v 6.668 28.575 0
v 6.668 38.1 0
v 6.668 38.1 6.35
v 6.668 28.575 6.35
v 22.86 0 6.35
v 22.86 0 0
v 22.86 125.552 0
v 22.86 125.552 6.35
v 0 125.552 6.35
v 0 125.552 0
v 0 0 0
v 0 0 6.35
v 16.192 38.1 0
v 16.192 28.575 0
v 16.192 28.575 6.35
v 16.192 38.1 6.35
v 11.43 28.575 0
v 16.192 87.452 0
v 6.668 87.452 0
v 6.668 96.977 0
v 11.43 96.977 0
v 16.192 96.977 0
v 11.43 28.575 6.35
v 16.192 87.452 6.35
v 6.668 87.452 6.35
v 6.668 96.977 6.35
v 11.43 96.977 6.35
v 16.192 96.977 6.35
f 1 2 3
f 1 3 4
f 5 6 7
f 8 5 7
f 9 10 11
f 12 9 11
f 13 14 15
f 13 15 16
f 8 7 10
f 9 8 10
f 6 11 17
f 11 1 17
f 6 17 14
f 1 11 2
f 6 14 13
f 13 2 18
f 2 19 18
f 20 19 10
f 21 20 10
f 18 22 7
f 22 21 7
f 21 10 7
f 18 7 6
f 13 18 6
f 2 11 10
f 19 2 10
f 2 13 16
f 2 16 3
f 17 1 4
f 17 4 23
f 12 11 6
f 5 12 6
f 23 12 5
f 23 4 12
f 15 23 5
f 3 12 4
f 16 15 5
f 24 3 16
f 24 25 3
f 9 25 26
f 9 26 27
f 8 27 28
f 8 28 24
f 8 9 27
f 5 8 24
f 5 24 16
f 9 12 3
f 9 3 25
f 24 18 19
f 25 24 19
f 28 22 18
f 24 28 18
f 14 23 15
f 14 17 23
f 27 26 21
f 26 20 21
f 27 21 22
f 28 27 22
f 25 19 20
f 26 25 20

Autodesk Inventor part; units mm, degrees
ref_plane "YZ Plane" through (0, 0, 0) normal (1, 0, 0) x (0, 1, 0)
ref_plane "XZ Plane" through (0, 0, 0) normal (0, 1, 0) x (-1, 0, 0)
ref_plane "XY Plane" through (0, 0, 0) normal (0, 0, 1) x (1, 0, 0)
sketch "Sketch1" plane through (0, 0, 0) normal (0, 0, 1) x (1, 0, 0)
  line L0 (0, 0) -> (22.86, 0)
  line L1 (22.86, 0) -> (22.86, 125.5522)
  line L2 (22.86, 125.5522) -> (0, 125.5522)
  line L3 (0, 125.5522) -> (0, 0)
  line L4 (0, 62.7761) -> (22.86, 62.7761) construction
  line L5 (11.43, 96.9772) -> (16.1925, 96.9772)
  line L6 (16.1925, 96.9772) -> (16.1925, 87.4522)
  line L7 (16.1925, 87.4522) -> (6.6675, 87.4522)
  line L8 (6.6675, 87.4522) -> (6.6675, 96.9772)
  line L9 (6.6675, 96.9772) -> (11.43, 96.9772)
  line L10 (11.43, 28.575) -> (16.1925, 28.575)
  line L11 (16.1925, 28.575) -> (16.1925, 38.1)
  line L12 (16.1925, 38.1) -> (6.6675, 38.1)
  line L13 (6.6675, 38.1) -> (6.6675, 28.575)
  line L14 (6.6675, 28.575) -> (11.43, 28.575)
  dimension "d0" = 22.86
  dimension "d1" = 125.5522
  dimension "d13" = 4.7625
  dimension "d14" = 9.525
  dimension "d15" = 9.525
  dimension "d16" = 28.575
  dimension "d17" = 6.6675
extrude "Extrusion2" add sketch "Sketch1" along normal blind 6.35
properties part number "HopperSupportRod_v1"
